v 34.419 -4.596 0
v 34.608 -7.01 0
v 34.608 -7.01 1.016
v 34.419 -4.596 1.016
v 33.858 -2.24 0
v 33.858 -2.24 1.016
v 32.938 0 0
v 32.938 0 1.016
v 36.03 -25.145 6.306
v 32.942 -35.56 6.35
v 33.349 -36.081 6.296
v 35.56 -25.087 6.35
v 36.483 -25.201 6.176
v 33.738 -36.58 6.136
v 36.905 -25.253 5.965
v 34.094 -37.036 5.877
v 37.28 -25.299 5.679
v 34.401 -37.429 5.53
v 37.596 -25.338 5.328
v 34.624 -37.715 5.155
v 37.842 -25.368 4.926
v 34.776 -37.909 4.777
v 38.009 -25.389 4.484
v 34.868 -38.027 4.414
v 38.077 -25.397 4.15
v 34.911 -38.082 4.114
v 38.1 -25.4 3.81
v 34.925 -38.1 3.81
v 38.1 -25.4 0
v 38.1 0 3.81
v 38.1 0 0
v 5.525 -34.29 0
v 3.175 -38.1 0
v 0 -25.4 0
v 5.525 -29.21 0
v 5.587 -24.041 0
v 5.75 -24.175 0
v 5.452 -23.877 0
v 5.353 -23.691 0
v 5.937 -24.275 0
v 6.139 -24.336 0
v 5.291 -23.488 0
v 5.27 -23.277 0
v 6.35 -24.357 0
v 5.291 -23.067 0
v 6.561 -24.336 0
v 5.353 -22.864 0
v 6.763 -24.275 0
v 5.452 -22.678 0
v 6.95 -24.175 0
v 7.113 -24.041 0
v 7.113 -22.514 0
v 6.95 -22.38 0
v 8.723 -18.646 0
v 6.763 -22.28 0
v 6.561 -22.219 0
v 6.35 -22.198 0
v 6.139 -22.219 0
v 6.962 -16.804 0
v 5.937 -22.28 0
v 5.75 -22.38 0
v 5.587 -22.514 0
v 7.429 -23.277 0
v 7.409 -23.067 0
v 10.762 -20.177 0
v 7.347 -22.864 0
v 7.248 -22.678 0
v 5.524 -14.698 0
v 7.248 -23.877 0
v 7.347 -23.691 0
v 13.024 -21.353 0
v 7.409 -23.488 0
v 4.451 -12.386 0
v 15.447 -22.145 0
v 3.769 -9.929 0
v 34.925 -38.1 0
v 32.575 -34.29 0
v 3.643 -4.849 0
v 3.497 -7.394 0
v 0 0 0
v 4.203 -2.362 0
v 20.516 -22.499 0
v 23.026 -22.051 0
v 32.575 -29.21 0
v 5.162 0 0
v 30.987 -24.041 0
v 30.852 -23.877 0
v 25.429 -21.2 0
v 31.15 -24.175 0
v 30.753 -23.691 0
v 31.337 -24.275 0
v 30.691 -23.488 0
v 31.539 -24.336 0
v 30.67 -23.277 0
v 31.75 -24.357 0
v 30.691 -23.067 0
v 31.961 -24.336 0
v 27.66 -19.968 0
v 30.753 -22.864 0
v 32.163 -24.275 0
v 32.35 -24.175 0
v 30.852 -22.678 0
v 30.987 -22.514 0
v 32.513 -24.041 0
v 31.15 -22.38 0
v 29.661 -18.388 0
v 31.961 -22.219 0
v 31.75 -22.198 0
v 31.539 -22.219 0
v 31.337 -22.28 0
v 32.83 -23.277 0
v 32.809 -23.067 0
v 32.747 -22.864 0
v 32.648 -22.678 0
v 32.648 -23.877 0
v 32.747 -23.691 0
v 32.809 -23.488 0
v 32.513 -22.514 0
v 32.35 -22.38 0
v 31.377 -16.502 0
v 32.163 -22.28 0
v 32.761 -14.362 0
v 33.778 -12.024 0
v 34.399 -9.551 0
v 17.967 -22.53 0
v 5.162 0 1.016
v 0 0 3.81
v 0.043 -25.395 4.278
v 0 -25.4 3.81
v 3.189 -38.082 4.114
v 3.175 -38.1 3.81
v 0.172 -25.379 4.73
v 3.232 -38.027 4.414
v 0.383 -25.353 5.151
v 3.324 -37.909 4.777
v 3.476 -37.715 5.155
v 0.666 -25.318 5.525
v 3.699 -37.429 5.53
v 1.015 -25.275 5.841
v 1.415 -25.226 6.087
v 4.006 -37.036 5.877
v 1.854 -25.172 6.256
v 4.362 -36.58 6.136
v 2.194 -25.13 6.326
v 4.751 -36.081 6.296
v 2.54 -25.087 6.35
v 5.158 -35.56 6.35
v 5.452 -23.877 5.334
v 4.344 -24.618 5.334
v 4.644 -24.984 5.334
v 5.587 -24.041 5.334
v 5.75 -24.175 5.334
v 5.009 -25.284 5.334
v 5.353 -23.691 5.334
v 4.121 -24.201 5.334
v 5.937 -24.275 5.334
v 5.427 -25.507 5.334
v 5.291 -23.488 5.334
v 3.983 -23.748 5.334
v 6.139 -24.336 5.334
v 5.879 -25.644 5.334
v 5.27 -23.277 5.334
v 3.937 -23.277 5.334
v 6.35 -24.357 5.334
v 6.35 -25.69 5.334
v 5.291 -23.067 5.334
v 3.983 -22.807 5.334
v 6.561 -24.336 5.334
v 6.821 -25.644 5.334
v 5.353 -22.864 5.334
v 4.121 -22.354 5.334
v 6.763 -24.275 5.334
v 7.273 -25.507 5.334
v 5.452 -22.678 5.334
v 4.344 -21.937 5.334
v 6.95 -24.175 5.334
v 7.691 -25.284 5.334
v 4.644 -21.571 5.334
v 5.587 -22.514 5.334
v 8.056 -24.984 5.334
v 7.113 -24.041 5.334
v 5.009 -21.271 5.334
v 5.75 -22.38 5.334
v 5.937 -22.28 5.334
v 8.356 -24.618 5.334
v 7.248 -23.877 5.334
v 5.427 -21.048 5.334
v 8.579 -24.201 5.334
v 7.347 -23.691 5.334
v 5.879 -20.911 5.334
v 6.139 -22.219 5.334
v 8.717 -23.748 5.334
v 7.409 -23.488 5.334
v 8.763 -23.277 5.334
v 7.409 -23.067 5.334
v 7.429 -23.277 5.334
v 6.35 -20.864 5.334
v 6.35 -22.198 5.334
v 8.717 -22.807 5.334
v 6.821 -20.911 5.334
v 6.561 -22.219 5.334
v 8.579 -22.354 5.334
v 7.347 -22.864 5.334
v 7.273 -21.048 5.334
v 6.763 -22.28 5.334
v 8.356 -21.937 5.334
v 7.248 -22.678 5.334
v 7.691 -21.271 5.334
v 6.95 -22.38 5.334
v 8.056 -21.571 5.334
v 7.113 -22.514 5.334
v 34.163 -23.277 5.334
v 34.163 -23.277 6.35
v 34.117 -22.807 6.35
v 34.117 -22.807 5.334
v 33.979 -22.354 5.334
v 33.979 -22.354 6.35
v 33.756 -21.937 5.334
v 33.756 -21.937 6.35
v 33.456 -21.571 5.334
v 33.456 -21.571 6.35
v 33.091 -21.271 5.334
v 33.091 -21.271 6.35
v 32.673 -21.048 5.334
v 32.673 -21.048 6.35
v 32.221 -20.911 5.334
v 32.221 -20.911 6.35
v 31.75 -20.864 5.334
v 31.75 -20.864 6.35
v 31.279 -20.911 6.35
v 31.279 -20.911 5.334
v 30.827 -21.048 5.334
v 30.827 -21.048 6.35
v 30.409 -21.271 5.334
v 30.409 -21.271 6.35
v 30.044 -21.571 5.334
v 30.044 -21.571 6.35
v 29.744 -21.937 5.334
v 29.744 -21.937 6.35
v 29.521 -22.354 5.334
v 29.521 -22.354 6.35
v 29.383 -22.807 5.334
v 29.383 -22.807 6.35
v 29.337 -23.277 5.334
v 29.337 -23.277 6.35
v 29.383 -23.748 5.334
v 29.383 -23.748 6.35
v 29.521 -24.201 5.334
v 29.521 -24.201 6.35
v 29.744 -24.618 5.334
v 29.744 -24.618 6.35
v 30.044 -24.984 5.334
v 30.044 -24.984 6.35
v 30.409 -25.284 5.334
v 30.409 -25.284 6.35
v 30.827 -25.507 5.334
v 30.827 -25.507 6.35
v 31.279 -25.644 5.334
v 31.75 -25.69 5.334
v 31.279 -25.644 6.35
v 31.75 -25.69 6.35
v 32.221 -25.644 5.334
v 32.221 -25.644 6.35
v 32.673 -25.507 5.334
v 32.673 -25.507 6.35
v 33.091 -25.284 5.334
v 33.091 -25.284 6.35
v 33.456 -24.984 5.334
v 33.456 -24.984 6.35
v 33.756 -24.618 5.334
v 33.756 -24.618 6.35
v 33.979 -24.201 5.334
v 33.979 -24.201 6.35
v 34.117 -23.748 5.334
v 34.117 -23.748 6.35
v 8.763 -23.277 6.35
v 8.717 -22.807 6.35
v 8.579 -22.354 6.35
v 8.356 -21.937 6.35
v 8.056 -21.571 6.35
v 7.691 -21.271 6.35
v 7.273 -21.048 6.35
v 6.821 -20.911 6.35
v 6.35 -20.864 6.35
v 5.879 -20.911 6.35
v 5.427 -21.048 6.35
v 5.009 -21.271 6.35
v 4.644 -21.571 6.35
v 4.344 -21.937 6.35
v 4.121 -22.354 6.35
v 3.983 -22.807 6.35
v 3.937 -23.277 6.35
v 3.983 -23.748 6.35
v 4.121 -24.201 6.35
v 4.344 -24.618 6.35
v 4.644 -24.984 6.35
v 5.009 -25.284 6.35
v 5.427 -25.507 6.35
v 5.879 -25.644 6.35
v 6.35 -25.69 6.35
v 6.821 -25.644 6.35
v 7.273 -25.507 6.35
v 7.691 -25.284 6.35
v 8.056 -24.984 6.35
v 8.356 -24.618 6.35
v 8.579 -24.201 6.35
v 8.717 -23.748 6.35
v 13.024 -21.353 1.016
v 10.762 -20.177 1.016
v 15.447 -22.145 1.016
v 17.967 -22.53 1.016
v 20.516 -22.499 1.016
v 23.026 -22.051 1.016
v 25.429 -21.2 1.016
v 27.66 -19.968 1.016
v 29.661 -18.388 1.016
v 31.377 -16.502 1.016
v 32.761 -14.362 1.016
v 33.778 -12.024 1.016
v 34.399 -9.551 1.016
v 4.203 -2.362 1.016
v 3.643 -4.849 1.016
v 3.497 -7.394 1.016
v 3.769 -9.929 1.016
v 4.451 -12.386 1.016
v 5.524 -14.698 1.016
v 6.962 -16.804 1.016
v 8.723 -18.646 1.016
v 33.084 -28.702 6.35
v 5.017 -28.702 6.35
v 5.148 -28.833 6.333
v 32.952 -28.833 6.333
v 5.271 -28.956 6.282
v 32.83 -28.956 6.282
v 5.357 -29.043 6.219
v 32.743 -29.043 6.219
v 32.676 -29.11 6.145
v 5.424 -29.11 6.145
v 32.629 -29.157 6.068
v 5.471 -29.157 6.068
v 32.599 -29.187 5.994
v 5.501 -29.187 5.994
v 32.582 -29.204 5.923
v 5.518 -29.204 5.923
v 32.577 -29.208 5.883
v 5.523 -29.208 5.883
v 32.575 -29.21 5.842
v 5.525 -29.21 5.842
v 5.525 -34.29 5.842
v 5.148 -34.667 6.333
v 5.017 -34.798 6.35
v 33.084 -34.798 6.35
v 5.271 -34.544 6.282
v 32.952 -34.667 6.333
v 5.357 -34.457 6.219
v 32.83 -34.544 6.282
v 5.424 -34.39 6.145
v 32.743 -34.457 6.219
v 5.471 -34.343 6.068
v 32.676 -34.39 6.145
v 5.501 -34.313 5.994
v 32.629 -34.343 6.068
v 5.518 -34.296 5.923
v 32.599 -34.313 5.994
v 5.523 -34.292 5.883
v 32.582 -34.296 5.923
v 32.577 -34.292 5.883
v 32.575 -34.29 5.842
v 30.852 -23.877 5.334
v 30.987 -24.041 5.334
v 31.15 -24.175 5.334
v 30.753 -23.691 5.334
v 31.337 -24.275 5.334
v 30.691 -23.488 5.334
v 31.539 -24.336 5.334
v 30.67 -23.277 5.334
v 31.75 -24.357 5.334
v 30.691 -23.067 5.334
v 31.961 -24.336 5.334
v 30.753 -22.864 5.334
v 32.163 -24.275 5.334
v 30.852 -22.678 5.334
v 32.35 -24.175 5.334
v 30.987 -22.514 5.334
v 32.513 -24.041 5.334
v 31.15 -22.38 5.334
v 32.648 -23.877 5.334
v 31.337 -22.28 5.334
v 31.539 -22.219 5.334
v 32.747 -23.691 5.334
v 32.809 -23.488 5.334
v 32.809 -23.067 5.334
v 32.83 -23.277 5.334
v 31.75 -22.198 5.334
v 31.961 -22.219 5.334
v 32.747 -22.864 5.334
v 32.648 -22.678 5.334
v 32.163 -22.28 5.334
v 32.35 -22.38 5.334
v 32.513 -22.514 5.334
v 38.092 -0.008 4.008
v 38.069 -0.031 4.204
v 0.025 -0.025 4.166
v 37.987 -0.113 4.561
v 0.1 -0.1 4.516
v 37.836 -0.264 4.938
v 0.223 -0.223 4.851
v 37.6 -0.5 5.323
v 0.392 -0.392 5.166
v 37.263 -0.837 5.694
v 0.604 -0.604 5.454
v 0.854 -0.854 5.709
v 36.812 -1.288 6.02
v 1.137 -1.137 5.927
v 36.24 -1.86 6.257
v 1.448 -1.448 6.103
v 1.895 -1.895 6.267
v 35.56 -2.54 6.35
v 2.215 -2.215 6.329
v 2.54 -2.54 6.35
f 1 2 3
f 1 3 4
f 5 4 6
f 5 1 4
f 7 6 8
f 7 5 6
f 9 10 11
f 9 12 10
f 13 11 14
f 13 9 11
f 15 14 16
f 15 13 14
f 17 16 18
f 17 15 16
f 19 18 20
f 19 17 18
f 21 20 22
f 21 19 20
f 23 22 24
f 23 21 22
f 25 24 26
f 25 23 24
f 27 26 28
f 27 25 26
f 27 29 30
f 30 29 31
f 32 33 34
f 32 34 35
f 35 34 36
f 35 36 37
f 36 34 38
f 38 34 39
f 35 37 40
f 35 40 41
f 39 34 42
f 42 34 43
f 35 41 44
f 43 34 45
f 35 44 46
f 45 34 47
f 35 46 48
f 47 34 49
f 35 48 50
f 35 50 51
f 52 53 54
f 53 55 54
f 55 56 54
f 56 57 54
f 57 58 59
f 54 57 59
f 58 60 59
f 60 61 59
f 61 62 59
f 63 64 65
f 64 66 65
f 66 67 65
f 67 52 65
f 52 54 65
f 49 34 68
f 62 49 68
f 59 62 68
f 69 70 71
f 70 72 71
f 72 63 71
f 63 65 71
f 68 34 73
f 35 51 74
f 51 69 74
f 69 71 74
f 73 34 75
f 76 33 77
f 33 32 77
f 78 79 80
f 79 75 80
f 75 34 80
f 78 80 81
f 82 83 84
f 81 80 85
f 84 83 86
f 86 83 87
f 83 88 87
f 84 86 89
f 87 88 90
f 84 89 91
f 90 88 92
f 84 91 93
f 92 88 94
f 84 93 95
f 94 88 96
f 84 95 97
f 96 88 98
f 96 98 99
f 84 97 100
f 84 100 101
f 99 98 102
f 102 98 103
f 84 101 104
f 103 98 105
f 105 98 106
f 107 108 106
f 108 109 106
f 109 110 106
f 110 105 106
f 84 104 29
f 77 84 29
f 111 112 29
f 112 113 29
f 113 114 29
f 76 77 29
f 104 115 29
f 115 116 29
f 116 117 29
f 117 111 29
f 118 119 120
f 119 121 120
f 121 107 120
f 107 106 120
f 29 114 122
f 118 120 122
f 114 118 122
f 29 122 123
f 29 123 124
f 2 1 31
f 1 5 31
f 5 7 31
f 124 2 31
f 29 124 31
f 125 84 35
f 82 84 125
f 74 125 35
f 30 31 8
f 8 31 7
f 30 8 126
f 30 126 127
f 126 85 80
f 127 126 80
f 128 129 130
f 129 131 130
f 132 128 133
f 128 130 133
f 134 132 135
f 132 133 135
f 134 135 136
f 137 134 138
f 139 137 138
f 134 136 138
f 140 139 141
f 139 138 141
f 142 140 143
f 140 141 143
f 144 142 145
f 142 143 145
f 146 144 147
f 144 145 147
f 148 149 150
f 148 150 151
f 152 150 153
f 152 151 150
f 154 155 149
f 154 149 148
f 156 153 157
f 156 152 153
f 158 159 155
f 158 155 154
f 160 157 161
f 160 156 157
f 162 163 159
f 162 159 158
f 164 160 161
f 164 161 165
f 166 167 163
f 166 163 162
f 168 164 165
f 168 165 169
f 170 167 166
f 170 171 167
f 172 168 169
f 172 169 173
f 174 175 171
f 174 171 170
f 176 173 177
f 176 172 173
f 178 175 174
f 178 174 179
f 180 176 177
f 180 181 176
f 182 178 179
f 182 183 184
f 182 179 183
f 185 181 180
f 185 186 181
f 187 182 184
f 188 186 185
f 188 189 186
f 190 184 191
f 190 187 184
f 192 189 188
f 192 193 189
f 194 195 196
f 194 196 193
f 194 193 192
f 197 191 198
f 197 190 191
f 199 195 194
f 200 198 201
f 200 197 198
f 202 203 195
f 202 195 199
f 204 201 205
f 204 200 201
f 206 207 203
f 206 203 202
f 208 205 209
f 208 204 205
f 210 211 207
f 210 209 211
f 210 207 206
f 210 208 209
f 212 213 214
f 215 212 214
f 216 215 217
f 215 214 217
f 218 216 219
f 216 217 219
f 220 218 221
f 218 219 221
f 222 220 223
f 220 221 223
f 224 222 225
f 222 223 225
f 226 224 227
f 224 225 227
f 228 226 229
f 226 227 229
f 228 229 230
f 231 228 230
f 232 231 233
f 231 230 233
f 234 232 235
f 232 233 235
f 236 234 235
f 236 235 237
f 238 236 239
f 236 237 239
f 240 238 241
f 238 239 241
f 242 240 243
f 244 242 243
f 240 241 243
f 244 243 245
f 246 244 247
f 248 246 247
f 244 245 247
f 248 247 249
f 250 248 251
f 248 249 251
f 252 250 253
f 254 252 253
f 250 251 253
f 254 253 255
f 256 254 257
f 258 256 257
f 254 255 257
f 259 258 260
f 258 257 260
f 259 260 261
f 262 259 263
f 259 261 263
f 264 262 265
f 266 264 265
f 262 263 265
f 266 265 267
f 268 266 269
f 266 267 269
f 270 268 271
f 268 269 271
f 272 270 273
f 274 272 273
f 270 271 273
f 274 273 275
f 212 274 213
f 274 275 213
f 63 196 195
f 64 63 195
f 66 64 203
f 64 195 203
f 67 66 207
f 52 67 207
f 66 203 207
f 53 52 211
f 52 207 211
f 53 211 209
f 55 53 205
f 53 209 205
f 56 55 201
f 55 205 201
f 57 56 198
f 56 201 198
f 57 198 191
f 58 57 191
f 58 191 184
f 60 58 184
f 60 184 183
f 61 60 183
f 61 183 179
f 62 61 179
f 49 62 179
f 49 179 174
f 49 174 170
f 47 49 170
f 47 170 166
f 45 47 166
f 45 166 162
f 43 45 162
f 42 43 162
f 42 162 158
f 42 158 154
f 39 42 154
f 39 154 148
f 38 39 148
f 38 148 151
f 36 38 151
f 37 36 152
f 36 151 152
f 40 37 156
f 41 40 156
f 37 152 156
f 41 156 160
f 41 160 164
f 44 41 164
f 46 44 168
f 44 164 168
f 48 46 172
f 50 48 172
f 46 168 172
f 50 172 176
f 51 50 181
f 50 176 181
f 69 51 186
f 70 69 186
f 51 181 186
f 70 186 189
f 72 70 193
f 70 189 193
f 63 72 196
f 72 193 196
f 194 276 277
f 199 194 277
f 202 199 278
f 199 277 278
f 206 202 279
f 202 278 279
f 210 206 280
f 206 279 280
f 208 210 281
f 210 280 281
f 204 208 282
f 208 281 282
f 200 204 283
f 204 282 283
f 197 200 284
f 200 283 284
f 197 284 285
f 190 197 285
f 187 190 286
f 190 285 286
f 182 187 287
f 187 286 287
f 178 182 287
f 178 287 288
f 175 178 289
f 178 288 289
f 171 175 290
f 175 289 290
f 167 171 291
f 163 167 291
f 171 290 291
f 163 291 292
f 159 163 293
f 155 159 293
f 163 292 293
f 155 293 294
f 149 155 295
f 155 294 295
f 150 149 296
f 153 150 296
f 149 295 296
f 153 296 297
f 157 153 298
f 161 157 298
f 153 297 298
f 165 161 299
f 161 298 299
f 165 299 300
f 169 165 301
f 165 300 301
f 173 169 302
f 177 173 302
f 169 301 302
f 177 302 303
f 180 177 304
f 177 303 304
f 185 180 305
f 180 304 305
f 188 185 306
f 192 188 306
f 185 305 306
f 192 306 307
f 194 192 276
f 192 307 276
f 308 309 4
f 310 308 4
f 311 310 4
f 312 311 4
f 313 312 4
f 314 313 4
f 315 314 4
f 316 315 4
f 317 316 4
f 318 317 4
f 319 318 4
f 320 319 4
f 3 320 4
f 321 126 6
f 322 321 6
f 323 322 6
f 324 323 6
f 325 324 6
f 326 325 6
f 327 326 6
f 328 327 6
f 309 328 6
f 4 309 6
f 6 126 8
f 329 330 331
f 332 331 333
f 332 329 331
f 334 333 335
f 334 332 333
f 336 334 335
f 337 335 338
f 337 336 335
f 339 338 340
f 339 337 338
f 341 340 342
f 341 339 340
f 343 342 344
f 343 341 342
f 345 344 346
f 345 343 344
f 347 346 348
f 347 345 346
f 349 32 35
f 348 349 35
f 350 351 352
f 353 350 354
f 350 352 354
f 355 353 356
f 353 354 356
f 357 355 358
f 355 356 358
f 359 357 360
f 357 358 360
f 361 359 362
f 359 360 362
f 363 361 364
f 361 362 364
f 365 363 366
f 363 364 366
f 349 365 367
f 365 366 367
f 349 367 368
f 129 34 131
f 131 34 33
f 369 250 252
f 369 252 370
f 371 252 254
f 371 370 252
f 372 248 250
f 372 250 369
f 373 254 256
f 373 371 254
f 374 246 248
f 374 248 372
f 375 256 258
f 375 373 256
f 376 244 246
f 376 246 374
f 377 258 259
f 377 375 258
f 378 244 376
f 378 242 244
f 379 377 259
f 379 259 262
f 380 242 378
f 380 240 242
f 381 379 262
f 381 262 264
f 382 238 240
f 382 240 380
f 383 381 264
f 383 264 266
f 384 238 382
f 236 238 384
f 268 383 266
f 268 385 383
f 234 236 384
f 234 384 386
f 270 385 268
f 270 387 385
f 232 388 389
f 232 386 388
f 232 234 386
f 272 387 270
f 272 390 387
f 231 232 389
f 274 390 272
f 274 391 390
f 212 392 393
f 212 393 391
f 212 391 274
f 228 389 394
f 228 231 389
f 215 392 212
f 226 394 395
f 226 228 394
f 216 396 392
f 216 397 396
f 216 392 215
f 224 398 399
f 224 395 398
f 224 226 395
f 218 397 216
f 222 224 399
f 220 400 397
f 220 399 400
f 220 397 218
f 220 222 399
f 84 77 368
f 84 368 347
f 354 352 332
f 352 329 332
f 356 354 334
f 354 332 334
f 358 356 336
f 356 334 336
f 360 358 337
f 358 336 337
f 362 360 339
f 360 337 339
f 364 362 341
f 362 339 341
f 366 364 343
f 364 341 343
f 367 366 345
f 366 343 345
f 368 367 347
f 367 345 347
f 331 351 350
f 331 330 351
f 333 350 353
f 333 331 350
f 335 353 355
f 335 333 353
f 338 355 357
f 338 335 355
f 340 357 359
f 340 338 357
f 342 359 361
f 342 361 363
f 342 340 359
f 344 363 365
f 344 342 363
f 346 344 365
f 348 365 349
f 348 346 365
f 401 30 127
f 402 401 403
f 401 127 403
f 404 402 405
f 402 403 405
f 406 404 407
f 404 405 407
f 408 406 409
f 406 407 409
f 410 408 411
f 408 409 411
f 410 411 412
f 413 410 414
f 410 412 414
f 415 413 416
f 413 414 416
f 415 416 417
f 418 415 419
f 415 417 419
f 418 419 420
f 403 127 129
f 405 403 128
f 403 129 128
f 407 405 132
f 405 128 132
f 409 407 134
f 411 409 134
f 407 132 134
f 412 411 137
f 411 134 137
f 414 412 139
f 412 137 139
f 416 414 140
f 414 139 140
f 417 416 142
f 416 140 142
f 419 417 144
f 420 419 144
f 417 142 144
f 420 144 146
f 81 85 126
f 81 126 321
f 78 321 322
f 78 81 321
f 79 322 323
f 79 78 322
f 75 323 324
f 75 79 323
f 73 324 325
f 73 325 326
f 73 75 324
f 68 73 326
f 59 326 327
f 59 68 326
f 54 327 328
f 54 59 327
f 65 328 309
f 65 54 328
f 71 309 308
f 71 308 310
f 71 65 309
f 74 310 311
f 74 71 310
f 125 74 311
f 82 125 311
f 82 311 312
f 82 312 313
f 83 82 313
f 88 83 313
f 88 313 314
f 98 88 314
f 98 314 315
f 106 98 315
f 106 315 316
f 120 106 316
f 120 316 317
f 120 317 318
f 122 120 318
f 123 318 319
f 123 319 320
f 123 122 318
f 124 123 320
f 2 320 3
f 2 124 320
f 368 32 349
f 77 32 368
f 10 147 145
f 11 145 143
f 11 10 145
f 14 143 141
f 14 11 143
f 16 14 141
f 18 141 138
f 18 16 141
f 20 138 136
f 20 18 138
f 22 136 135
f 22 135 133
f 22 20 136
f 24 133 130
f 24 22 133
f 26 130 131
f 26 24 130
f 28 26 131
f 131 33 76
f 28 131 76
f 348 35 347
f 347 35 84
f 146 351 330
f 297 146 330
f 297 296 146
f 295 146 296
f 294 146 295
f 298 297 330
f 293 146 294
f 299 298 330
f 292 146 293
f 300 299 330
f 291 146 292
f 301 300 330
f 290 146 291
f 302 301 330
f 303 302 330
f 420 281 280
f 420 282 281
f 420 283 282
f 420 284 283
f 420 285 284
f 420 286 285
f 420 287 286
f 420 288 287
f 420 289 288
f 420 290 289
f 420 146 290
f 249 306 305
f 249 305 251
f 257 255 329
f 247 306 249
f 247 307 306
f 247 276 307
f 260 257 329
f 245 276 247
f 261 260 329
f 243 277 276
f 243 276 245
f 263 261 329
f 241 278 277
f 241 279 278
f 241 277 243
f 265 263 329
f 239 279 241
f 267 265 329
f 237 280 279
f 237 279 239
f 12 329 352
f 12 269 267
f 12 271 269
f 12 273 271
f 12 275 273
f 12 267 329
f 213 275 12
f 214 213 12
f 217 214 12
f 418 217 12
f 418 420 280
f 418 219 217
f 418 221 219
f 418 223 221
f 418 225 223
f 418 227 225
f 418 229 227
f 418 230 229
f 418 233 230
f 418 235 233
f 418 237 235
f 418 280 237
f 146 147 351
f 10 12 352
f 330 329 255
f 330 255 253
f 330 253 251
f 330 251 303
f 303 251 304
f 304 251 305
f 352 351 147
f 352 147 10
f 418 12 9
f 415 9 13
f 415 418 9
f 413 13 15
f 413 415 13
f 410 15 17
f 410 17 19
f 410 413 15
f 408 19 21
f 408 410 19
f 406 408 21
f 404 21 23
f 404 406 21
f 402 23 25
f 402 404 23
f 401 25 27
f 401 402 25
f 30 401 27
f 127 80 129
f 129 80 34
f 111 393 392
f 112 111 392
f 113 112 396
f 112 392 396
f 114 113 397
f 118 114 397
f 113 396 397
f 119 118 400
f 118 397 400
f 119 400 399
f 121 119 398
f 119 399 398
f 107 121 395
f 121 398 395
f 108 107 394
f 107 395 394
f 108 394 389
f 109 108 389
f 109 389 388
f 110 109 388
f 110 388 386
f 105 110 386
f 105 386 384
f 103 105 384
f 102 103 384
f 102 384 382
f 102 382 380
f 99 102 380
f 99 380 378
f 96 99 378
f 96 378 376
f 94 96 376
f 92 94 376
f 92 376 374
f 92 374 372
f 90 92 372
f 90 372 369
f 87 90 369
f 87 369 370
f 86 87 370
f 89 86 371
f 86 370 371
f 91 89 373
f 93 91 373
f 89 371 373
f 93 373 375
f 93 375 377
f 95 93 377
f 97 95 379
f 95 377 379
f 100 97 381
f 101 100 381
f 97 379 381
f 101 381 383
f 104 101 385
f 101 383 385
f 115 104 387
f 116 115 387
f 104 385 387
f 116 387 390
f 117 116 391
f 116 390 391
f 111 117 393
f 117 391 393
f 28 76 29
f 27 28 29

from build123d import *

# Parameters (mm, degrees)
F0_W     = 27.051
F0_H     = 5.08
F1_DEPTH = 6.35
F2_DEPTH = 1.016
F3_R     = 1.0795
F4_DEPTH = 6.351
F3_R_2   = 2.413
F5_DEPTH = 1.016
F6_R     = 2.54
F7_R     = 0.508


with BuildPart() as f1:
    # F0 (on Top) → F1 (new body)
    with BuildSketch(Plane.XY):
        with BuildLine():
            Line((5.1615120301, 0), (0, 0))
            Line((0, 0), (0, -25.4))
            Line((0, -25.4), (3.175, -38.1))
            Line((3.175, -38.1), (34.925, -38.1))
            Line((34.925, -38.1), (38.1, -25.4))
            Line((38.1, -25.4), (38.1, 0))
            Line((38.1, 0), (32.9384879699, 0))
            ThreePointArc((32.9384879699, 0), (34.184496322, -3.4072309325), (34.6075, -7.0104))
            ThreePointArc((34.6075, -7.0104), (15.4468309325, -22.144896322), (5.1615120301, 0))
        make_face()
        with Locations((19.05, -31.75)):
            Rectangle(F0_W, F0_H, mode=Mode.SUBTRACT)
        with BuildLine():
            Line((32.9384879699, 0), (5.1615120301, 0))
            ThreePointArc((5.1615120301, 0), (15.4468309325, -22.144896322), (34.6075, -7.0104))
            ThreePointArc((34.6075, -7.0104), (34.184496322, -3.4072309325), (32.9384879699, 0))
        make_face()
    extrude(amount=F1_DEPTH)

    # F0 (on Top) → F2 (cut)
    with BuildSketch(Plane.XY):
        with BuildLine():
            Line((32.9384879699, 0), (5.1615120301, 0))
            ThreePointArc((5.1615120301, 0), (15.4468309325, -22.144896322), (34.6075, -7.0104))
            ThreePointArc((34.6075, -7.0104), (34.184496322, -3.4072309325), (32.9384879699, 0))
        make_face()
    extrude(amount=F2_DEPTH, mode=Mode.SUBTRACT)

    # F3 (on face) → F4 (cut, through all)
    with BuildSketch(Plane.XY.offset(6.35)):
        with Locations((6.35, -23.277434341)):
            Circle(F3_R)
        with Locations((31.75, -23.277434341)):
            Circle(F3_R)
    extrude(amount=-F4_DEPTH, mode=Mode.SUBTRACT)

    # F3 (on face) → F5 (cut)
    with BuildSketch(Plane.XY.offset(6.35)):
        with Locations((31.75, -23.277434341)):
            Circle(F3_R_2)
        with Locations((31.75, -23.277434341)):
            Circle(F3_R, mode=Mode.SUBTRACT)
        with Locations((6.35, -23.277434341)):
            Circle(F3_R_2)
        with Locations((6.35, -23.277434341)):
            Circle(F3_R, mode=Mode.SUBTRACT)
    extrude(amount=-F5_DEPTH, mode=Mode.SUBTRACT)

    # F6
    f6_edges = [f1.edges().sort_by_distance(p)[0] for p in [
        (38.1, -12.7, 6.35),
        (36.5125, -31.75, 6.35),
        (19.05, -38.1, 6.35),
        (1.5875, -31.75, 6.35),
        (0, -12.7, 6.35),
        (19.05, 0, 6.35),
    ]]
    fillet(f6_edges, radius=F6_R)

    # F7
    f7_edges = [f1.edges().sort_by_distance(p)[0] for p in [
        (5.5245, -31.75, 6.35),
        (19.05, -34.29, 6.35),
        (19.05, -29.21, 6.35),
        (32.5755, -31.75, 6.35),
    ]]
    fillet(f7_edges, radius=F7_R)


solid = f1.part
